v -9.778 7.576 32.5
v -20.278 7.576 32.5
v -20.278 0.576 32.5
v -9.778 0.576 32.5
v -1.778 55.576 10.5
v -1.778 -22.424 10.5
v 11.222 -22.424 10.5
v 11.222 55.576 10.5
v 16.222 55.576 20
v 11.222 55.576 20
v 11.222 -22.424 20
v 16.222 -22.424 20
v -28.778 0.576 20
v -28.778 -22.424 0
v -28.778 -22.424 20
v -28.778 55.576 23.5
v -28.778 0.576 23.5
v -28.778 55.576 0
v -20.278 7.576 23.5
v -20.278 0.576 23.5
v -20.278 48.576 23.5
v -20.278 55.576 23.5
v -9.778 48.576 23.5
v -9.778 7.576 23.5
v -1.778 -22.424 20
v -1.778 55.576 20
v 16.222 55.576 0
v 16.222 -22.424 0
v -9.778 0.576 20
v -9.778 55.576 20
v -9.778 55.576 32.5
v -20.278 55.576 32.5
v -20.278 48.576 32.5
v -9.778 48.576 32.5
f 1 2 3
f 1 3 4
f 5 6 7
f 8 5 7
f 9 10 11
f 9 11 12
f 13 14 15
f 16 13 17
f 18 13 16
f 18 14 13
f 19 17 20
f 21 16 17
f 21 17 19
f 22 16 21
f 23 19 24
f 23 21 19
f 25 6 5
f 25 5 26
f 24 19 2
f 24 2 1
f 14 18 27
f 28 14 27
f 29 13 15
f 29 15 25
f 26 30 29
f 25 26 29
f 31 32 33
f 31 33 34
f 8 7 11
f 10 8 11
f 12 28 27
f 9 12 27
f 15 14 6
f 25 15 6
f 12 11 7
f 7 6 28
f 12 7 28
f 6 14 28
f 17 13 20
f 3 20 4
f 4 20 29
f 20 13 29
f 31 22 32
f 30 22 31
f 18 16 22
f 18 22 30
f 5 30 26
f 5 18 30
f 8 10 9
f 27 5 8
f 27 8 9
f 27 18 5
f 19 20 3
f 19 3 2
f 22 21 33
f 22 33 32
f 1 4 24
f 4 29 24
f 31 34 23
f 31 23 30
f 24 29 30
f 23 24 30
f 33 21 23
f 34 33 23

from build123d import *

# Parameters (mm, degrees)
SKETCH4_W           = 45
SKETCH4_H           = 78
BOSS_EXTRUDE1_DEPTH = 20
SKETCH6_W           = 13
SKETCH6_H           = 9.5
CUT_EXTRUDE1_DEPTH  = 86.511276786
SKETCH7_W           = 10.5
SKETCH7_H           = 55
BOSS_EXTRUDE2_DEPTH = 3.5
SKETCH8_W           = 10.5
SKETCH8_H           = 7
BOSS_EXTRUDE3_DEPTH = 9
SKETCH9_W           = 8.5
SKETCH9_H           = 55
BOSS_EXTRUDE4_DEPTH = 3.5


with BuildPart() as part:
    # Sketch4 → Boss-Extrude1 (new body)
    with BuildSketch(Plane.XY):
        with Locations((-6.278089888, 16.575842697)):
            Rectangle(SKETCH4_W, SKETCH4_H)
    extrude(amount=BOSS_EXTRUDE1_DEPTH)

    # Sketch6 → Cut-Extrude1 (cut, through all)
    with BuildSketch(Plane.XZ.offset(22.424157303)):
        with Locations((4.721910112, 15.25)):
            Rectangle(SKETCH6_W, SKETCH6_H)
    extrude(amount=-CUT_EXTRUDE1_DEPTH, mode=Mode.SUBTRACT)

    # Sketch7 → Boss-Extrude2 (add)
    with BuildSketch(Plane.XY.offset(20)):
        with Locations((-15.028089888, 28.075842697)):
            Rectangle(SKETCH7_W, SKETCH7_H)
    extrude(amount=BOSS_EXTRUDE2_DEPTH)

    # Sketch8 → Boss-Extrude3 (add)
    with BuildSketch(Plane.XY.offset(23.5)):
        with Locations((-15.028089888, 4.075842697)):
            Rectangle(SKETCH8_W, SKETCH8_H)
        with Locations((-15.028089888, 52.075842697)):
            Rectangle(SKETCH8_W, SKETCH8_H)
    extrude(amount=BOSS_EXTRUDE3_DEPTH)

    # Sketch9 → Boss-Extrude4 (add)
    with BuildSketch(Plane.XY.offset(20)):
        with Locations((-24.528089888, 28.075842697)):
            Rectangle(SKETCH9_W, SKETCH9_H)
    extrude(amount=BOSS_EXTRUDE4_DEPTH)


solid = part.part
